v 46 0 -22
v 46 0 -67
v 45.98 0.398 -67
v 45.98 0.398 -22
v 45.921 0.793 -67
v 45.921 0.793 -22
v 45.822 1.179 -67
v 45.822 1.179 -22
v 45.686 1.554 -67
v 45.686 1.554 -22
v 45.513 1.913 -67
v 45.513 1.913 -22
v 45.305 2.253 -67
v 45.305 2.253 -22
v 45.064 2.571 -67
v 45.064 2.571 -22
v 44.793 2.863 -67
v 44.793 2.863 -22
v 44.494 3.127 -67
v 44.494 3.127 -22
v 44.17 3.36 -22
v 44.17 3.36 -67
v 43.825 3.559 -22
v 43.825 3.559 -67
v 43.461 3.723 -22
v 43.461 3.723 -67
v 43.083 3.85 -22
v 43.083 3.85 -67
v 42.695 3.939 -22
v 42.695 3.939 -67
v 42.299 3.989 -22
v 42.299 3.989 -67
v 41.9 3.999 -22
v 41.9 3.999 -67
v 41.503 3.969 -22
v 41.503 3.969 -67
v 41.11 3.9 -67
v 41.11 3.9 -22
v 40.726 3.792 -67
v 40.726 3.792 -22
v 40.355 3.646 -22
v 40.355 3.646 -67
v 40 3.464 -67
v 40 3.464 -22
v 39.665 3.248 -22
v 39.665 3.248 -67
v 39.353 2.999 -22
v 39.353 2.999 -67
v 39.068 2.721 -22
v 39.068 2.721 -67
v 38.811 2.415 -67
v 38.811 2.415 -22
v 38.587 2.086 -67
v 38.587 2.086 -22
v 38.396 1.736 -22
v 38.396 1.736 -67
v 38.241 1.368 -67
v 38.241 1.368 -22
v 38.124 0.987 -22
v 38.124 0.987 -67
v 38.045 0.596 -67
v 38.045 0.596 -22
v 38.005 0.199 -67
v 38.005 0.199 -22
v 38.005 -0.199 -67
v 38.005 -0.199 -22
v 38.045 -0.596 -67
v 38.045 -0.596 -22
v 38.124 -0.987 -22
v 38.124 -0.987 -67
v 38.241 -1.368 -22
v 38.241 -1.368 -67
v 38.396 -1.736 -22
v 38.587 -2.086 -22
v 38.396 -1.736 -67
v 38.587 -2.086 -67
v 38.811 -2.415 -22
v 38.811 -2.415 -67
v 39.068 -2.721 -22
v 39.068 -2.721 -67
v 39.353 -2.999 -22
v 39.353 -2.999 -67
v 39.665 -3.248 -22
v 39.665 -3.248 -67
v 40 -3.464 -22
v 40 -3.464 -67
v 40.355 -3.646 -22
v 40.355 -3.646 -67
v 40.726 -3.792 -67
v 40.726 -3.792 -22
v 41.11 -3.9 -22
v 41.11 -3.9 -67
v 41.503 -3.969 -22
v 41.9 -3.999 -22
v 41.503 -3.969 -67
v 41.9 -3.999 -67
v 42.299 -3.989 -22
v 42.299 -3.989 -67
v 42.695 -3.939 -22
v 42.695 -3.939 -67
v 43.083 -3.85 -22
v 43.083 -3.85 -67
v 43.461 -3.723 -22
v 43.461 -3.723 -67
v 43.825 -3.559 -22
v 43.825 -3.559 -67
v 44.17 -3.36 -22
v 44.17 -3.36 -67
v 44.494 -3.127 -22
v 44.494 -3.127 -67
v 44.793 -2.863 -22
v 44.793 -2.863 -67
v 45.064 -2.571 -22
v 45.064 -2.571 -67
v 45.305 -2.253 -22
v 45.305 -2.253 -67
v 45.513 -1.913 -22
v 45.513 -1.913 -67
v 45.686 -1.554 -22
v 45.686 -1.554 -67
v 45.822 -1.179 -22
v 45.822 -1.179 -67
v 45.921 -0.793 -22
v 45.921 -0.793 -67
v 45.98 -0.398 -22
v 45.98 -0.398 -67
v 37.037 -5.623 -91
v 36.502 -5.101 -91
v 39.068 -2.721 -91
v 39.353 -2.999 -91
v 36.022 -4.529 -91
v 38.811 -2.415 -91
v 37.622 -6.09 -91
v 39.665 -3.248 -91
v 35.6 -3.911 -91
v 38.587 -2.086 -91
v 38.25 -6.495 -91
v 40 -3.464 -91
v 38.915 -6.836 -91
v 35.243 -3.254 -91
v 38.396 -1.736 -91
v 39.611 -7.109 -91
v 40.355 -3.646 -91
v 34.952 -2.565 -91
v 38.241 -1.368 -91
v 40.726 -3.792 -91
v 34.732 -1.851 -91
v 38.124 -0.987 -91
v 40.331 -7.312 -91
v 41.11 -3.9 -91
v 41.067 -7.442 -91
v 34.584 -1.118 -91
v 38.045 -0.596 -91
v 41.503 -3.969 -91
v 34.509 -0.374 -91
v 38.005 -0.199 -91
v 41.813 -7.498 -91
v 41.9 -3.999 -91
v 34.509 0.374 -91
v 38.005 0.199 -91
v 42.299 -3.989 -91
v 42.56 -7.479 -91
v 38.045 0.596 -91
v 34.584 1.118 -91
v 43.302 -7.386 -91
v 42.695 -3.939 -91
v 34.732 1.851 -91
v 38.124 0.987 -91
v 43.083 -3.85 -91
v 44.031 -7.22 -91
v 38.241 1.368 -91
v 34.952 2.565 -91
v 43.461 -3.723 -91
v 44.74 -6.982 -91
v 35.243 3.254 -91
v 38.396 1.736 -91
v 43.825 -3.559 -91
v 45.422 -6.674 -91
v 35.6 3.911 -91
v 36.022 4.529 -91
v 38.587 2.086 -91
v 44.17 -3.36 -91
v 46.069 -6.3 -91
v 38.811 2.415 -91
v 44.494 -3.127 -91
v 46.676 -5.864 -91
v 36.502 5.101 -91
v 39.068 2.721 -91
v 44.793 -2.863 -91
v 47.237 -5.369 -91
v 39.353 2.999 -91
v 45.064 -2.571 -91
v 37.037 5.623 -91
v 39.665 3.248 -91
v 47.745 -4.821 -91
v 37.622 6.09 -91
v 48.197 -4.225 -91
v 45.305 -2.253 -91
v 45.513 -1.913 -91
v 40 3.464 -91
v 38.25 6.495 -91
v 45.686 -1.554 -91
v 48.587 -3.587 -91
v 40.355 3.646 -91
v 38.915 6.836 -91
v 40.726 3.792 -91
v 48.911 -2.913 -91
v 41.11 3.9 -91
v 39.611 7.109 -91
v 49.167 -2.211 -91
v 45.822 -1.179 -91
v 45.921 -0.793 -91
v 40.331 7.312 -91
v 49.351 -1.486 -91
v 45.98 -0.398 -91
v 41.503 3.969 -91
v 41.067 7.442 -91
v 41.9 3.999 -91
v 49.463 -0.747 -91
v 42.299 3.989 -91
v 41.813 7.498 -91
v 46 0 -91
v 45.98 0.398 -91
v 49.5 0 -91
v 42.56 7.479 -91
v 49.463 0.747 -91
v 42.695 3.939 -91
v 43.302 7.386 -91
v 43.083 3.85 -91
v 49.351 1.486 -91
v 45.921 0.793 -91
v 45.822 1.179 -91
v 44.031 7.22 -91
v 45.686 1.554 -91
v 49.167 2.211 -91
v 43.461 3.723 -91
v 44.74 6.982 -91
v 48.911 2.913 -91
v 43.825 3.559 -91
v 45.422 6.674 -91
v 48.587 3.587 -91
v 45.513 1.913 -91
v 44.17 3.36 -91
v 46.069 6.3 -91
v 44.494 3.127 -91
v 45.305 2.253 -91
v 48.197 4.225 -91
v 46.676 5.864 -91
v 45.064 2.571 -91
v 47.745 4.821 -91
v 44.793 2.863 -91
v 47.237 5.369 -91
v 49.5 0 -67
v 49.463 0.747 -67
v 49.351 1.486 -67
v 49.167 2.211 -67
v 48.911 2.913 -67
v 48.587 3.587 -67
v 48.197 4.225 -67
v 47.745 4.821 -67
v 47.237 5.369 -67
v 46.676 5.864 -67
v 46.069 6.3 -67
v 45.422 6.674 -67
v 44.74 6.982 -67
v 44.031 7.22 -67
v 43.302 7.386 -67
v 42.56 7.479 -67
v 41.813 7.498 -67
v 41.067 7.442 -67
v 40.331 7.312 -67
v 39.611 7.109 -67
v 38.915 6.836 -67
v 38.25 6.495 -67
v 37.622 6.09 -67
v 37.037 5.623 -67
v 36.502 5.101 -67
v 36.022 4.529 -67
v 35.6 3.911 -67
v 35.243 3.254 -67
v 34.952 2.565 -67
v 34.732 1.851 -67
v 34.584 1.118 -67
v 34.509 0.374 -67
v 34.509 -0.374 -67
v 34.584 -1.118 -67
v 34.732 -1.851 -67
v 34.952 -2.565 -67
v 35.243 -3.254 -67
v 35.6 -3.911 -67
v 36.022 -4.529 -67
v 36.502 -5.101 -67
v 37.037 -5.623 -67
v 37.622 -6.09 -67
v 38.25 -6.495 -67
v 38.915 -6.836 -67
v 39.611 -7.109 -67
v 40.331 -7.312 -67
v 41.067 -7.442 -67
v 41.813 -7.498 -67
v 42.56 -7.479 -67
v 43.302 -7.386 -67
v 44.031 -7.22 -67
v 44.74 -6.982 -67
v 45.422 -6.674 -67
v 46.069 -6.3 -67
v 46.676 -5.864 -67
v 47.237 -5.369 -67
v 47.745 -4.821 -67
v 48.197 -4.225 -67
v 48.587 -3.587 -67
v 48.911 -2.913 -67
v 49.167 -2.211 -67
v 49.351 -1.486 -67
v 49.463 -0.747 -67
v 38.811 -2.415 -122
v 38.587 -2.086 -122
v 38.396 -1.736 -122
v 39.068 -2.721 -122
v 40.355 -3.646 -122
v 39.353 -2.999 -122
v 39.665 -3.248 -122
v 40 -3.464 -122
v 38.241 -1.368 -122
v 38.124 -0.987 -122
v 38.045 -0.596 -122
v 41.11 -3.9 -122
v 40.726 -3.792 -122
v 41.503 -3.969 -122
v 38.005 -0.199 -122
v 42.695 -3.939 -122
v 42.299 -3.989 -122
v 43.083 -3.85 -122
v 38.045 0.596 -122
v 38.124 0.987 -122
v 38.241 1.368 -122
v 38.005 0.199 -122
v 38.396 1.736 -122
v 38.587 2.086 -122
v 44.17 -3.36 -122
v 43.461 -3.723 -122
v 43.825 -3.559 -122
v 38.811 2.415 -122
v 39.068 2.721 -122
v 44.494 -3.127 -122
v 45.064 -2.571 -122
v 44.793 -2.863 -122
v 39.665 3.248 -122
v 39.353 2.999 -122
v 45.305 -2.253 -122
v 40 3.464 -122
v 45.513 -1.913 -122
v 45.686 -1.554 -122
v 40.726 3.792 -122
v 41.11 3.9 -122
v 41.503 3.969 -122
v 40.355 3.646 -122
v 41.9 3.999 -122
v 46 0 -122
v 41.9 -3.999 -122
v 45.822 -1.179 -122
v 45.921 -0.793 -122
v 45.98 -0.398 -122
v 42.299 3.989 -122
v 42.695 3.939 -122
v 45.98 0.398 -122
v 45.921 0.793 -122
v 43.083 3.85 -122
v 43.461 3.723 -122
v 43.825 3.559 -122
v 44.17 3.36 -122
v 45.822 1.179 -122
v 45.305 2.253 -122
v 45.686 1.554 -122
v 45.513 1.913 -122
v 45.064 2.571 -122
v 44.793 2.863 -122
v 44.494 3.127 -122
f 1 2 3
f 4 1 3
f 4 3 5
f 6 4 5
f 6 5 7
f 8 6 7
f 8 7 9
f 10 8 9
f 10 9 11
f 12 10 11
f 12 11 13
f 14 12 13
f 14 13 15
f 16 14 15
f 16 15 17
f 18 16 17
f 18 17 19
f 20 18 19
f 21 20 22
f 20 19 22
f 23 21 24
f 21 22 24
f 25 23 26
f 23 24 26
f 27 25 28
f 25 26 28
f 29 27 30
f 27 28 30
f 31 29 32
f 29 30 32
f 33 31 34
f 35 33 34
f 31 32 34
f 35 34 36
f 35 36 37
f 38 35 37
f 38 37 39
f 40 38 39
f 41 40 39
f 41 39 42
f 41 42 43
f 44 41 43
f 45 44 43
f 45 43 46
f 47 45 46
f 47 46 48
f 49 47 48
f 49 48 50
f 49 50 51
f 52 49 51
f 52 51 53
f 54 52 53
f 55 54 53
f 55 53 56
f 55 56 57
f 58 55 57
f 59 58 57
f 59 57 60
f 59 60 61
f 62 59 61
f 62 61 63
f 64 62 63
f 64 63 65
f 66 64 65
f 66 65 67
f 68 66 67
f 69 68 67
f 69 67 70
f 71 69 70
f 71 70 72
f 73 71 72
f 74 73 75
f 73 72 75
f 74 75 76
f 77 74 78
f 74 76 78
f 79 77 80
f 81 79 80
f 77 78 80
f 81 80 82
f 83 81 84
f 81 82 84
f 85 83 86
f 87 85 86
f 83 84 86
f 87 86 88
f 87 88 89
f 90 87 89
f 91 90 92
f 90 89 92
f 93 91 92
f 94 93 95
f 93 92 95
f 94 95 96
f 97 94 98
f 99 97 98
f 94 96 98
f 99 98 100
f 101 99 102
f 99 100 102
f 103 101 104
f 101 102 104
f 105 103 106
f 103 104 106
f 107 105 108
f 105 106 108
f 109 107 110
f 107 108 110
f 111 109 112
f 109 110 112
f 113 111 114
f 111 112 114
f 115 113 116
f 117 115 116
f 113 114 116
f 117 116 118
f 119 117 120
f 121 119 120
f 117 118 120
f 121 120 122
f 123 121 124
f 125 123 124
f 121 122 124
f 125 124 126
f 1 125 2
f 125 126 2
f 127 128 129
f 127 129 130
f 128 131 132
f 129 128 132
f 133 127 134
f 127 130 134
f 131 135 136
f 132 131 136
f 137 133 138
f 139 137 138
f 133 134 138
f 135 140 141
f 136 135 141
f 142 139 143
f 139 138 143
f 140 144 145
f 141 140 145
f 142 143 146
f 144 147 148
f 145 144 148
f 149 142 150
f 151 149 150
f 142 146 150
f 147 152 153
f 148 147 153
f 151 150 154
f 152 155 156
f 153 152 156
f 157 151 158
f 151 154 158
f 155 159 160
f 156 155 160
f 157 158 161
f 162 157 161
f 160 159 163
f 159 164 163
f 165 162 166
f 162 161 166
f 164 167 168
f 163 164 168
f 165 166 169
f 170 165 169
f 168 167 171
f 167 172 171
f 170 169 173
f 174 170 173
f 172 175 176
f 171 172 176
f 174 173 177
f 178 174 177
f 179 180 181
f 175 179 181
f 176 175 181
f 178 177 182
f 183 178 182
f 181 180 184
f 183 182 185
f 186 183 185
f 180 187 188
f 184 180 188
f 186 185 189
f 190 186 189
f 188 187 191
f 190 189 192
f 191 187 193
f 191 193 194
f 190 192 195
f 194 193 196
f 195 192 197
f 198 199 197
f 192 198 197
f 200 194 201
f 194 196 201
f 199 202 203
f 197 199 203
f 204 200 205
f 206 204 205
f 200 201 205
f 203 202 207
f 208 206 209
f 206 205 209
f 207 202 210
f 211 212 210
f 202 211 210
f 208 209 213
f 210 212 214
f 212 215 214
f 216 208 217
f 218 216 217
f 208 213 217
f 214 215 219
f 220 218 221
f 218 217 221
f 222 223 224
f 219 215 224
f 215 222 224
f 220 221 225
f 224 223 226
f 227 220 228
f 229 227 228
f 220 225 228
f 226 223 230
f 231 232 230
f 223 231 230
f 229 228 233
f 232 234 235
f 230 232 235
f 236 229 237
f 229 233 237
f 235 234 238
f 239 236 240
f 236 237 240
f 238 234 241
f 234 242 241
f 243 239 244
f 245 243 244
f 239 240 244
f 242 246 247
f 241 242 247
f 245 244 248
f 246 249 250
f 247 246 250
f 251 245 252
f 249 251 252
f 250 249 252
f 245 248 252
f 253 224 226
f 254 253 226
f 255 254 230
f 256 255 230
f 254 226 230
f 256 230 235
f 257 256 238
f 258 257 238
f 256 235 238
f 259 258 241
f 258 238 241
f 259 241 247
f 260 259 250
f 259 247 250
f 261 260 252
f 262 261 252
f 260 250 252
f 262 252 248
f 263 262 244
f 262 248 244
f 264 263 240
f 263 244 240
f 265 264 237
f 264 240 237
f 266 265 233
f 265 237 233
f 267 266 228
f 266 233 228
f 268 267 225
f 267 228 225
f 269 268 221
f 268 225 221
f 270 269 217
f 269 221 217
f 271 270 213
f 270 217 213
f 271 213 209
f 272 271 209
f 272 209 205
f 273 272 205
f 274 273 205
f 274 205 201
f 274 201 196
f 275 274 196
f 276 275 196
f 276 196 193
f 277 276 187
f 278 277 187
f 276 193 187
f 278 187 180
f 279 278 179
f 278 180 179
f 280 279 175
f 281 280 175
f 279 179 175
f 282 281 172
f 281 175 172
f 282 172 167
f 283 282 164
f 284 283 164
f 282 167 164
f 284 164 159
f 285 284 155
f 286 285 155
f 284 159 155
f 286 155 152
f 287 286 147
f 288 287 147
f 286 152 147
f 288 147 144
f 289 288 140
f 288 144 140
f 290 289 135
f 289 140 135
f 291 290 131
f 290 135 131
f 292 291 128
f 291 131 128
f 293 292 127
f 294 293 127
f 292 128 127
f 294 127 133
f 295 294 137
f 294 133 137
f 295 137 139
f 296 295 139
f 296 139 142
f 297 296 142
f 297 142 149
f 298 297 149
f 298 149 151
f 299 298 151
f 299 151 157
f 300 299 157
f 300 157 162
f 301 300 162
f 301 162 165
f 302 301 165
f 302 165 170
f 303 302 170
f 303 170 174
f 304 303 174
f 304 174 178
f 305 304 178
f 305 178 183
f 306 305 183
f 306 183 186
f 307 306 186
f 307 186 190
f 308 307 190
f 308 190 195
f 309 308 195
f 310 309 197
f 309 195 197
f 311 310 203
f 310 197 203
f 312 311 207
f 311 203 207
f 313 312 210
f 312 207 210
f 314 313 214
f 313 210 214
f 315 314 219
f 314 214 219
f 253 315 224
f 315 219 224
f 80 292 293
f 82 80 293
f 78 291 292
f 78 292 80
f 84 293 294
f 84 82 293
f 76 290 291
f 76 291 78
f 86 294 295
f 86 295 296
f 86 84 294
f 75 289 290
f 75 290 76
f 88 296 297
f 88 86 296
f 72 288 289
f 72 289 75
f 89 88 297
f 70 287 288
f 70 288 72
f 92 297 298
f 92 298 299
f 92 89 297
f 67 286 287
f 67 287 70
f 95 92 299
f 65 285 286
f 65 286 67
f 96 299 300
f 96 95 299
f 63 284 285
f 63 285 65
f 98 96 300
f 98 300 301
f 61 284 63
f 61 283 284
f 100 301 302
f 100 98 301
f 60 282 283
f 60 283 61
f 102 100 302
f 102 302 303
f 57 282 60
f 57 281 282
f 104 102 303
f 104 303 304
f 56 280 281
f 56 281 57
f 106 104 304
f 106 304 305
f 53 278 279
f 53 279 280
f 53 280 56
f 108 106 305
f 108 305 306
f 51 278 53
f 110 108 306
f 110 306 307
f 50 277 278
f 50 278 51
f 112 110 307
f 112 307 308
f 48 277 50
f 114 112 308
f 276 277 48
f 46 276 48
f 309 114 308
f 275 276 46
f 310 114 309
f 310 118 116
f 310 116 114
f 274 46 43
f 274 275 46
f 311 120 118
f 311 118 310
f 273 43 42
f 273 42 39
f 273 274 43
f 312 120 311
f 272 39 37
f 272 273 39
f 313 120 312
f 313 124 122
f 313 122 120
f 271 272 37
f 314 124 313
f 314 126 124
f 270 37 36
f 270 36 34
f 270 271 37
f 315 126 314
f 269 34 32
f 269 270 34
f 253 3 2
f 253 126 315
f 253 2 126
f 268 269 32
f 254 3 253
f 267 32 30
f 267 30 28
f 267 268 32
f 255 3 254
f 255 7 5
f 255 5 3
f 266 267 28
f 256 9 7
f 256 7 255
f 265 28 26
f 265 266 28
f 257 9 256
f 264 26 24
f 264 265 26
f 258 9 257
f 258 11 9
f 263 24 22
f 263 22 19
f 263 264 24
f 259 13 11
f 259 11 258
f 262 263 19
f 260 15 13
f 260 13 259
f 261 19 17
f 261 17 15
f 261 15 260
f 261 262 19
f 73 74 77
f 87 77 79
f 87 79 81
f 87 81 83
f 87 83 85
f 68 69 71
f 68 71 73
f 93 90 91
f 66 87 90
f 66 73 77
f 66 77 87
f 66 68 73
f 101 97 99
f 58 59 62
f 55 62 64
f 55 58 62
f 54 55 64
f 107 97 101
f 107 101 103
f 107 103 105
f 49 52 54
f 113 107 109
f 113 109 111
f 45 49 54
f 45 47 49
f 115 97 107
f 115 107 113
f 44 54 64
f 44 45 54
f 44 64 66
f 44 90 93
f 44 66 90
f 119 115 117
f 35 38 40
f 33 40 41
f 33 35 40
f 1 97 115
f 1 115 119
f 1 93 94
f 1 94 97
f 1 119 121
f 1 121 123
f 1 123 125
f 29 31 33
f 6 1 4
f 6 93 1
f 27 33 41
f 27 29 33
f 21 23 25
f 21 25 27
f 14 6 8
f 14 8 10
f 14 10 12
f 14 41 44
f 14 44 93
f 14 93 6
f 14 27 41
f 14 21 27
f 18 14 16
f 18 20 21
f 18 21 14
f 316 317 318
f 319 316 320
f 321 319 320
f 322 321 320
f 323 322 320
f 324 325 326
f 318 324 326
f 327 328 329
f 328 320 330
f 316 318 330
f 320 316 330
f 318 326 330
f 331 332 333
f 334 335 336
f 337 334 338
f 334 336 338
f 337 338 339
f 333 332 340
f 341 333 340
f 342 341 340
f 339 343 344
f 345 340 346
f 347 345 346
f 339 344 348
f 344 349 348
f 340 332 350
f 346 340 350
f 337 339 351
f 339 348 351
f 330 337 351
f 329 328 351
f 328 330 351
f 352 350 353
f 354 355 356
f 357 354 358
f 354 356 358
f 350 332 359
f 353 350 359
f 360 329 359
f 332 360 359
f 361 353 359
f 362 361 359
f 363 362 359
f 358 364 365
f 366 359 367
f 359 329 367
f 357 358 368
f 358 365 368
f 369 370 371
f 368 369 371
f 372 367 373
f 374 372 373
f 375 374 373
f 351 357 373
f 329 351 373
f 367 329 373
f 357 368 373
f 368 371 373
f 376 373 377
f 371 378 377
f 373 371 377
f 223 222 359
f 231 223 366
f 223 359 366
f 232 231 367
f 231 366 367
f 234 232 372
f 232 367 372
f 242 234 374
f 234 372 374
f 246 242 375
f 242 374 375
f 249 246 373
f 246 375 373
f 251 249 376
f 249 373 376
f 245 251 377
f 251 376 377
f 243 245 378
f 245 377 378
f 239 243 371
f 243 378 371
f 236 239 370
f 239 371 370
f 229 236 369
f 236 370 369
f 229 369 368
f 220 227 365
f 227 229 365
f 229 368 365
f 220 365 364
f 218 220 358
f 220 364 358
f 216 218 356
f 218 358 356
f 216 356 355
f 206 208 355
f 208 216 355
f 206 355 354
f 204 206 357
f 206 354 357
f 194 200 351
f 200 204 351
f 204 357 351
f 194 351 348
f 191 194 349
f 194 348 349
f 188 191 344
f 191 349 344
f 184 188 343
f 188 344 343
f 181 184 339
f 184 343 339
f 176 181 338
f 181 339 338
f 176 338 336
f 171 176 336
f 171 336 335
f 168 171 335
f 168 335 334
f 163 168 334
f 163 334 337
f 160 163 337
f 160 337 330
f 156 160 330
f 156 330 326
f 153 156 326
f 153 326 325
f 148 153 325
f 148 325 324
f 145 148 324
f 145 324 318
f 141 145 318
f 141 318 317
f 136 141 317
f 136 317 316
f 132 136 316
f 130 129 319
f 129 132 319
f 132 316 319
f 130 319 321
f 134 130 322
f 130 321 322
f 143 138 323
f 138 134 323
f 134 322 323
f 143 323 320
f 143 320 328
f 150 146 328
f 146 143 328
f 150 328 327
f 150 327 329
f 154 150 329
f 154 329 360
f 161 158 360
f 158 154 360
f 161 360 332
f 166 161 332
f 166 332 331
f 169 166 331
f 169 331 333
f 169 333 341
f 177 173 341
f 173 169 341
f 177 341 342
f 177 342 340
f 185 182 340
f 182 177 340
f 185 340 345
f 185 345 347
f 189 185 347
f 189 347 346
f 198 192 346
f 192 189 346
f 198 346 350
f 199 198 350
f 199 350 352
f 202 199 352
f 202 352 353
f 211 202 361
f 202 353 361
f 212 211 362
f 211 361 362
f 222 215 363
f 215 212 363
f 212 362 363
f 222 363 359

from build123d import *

# Parameters (mm, degrees)
CYLINDER007_R     = 4
CYLINDER007_DEPTH = 100
CYLINDER013_R     = 7.5
CYLINDER013_DEPTH = 24


with BuildPart() as rod_cylinder:
    # Cylinder007 → Cylinder007 (new body)
    with BuildSketch(Plane(origin=(42, 0, -122), x_dir=(1, 0, 0), z_dir=(0, 0, 1))):
        Circle(CYLINDER007_R)
    extrude(amount=CYLINDER007_DEPTH)


with BuildPart() as rod_fusion:
    # Cylinder013 → Cylinder013 (new body)
    with BuildSketch(Plane(origin=(42, 0, -91), x_dir=(1, 0, 0), z_dir=(0, 0, 1))):
        Circle(CYLINDER013_R)
    extrude(amount=CYLINDER013_DEPTH)

    # Fusion005: union rod cylinder
    add(rod_cylinder.part)


solid = rod_fusion.part
